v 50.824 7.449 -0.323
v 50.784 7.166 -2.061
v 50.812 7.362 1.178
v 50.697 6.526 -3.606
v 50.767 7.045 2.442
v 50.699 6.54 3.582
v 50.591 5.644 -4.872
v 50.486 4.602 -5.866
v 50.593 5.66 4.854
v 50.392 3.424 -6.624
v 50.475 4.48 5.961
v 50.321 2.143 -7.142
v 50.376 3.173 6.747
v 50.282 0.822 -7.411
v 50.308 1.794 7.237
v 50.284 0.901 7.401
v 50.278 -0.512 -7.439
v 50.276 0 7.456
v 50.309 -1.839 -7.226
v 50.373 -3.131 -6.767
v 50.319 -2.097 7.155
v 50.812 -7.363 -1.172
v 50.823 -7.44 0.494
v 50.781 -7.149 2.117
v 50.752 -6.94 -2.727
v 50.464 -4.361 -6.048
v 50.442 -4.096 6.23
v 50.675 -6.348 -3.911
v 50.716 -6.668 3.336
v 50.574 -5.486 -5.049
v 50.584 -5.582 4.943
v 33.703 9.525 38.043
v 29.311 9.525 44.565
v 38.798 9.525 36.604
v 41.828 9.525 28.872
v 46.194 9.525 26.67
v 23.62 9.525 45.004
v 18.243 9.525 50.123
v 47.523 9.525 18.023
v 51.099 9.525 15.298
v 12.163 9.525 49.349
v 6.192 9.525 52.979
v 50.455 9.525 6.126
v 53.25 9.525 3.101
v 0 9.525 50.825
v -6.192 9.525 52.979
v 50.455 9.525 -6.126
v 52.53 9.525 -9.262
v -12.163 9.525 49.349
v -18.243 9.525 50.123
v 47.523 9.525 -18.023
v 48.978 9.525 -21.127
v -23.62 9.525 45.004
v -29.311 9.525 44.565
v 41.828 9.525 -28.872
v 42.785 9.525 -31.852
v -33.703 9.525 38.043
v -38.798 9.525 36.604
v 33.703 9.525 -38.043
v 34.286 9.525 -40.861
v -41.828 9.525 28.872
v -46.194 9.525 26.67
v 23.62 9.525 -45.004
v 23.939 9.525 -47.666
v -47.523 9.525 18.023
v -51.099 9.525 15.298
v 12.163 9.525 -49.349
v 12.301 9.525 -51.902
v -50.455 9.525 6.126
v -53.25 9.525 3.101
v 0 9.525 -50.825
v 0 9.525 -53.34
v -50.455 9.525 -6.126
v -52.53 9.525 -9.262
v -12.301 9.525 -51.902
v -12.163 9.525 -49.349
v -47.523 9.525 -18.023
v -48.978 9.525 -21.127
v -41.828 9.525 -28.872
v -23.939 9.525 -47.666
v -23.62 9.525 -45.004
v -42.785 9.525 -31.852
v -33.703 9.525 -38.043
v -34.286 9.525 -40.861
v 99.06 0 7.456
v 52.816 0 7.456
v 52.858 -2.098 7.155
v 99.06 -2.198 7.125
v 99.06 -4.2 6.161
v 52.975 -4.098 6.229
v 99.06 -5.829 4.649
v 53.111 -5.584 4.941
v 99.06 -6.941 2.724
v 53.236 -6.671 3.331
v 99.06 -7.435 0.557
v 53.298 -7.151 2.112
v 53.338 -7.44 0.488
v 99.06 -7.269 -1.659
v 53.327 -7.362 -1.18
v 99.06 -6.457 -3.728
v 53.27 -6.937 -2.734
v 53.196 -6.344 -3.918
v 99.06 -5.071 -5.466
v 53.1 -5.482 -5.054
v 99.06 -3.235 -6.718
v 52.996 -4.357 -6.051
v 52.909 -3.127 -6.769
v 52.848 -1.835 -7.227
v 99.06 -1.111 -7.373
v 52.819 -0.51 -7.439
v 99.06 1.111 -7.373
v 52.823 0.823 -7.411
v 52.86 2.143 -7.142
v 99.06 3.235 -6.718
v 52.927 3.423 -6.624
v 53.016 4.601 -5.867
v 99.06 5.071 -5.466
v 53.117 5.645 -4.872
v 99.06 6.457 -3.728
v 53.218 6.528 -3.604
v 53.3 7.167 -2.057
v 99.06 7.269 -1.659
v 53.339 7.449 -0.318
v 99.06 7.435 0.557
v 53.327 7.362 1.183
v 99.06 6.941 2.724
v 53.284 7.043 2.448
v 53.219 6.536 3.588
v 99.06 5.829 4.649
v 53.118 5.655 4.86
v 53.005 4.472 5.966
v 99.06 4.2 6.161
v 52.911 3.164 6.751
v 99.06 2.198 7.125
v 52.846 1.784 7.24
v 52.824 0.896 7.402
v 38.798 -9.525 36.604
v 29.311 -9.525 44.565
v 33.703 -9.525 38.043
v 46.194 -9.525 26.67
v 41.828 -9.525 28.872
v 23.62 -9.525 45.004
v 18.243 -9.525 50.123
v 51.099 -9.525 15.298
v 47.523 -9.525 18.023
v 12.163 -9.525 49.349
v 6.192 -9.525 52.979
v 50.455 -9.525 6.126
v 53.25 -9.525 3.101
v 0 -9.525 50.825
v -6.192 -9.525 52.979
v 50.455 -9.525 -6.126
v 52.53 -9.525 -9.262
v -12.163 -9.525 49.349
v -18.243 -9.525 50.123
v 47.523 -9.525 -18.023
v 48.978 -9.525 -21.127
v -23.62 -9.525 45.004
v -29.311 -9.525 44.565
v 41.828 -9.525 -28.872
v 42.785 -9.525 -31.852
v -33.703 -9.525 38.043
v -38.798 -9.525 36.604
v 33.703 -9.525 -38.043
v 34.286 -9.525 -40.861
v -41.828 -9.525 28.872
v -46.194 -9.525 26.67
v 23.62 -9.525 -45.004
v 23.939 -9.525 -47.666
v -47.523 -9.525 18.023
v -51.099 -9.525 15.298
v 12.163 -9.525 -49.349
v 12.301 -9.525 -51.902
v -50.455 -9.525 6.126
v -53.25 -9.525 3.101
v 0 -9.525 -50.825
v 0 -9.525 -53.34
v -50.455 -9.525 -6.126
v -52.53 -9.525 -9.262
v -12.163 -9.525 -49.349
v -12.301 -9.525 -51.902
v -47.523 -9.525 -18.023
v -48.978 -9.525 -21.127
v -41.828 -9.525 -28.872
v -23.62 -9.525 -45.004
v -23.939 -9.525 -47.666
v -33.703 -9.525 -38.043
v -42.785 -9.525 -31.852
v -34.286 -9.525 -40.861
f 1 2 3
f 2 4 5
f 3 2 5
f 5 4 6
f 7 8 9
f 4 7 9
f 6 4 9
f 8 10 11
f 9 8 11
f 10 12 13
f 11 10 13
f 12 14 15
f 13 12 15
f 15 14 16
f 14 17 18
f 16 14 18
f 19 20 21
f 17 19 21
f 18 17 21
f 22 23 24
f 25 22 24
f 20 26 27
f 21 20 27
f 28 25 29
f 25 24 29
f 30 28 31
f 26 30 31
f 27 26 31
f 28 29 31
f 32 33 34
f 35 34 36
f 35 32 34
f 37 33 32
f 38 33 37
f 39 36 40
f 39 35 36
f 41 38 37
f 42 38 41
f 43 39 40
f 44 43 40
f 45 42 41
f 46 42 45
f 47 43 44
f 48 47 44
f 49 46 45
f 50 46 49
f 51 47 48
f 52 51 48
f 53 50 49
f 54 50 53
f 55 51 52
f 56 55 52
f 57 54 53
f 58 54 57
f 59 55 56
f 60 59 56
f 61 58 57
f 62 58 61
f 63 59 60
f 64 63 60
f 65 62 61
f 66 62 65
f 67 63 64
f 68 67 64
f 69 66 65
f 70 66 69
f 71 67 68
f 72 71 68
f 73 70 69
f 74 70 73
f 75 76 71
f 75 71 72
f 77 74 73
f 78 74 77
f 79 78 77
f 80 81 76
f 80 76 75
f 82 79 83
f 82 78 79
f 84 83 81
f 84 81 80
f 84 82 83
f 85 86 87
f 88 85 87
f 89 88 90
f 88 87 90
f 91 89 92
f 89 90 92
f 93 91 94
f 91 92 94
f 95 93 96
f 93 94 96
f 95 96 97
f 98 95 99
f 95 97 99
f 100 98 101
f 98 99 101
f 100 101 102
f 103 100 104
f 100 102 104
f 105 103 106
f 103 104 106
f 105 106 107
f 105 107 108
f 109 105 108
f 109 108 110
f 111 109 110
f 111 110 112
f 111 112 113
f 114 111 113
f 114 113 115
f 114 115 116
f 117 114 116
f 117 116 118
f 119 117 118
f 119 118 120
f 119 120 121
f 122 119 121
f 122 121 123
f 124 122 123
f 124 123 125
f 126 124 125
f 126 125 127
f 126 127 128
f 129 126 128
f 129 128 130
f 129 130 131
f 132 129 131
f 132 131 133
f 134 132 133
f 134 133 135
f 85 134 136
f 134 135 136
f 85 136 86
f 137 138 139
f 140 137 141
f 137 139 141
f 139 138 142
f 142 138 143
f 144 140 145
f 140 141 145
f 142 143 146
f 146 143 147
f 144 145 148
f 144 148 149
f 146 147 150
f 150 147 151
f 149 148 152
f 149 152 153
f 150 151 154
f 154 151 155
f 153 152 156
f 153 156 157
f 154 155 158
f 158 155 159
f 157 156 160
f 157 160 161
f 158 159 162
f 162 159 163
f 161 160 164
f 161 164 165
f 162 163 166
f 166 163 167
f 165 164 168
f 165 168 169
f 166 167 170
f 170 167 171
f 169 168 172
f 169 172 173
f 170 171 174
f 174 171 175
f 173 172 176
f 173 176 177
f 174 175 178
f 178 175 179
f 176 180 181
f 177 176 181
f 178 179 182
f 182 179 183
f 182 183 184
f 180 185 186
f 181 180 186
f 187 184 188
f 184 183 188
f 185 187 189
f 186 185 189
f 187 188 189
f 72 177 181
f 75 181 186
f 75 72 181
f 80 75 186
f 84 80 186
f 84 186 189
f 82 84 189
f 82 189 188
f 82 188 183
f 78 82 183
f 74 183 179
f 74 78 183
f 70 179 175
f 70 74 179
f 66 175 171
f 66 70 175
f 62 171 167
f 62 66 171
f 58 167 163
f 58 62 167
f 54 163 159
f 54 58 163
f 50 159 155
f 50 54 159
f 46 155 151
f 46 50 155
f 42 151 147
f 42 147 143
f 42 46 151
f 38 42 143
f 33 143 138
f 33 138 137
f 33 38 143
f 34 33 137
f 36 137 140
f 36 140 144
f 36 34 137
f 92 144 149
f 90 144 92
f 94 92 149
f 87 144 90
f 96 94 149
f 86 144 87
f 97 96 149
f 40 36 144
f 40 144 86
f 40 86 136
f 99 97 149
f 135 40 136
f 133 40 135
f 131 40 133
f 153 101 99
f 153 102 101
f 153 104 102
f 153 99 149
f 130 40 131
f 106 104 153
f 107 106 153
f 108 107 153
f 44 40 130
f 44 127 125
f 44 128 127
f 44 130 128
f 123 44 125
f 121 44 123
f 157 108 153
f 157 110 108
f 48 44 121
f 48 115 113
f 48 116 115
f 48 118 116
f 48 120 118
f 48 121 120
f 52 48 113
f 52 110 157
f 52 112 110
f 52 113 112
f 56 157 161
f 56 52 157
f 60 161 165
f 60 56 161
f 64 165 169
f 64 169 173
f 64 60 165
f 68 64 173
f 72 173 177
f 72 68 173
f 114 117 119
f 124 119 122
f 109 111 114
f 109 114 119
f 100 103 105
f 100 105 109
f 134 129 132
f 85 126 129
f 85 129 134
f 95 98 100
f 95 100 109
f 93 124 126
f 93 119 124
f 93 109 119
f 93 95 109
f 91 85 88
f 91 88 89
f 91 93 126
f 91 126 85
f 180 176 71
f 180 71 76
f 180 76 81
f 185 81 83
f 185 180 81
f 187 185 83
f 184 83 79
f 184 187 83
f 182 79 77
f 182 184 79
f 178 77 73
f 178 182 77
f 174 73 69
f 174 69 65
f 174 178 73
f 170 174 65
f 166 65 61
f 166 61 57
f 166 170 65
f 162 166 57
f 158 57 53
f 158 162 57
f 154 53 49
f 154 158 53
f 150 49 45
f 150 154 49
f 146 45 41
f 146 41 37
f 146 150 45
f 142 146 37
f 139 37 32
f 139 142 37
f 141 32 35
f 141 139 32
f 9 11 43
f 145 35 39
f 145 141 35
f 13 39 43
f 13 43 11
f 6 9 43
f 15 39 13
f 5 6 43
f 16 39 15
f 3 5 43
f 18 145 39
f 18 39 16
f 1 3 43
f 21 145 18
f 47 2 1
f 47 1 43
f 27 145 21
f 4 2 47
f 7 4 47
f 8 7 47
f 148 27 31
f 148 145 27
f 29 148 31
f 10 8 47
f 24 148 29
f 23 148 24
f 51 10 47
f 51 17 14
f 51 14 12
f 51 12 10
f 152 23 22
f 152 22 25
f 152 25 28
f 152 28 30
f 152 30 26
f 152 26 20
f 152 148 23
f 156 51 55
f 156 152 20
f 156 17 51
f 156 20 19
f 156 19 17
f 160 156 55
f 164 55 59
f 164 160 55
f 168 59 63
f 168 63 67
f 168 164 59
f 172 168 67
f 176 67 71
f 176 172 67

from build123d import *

# Parameters (mm, degrees)
CROQUIS1_R              = 53.34
CROQUIS1_R_2            = 50.8254
SALIENTE_EXTRUIR1_DEPTH = 9.525
CROQUIS2_R              = 7.45617
SALIENTE_EXTRUIR2_DEPTH = 99.06
CROQUIS3_R              = 50.8254
CORTAR_EXTRUIR1_DEPTH   = 49.53


with BuildPart() as part:
    # Croquis1 → Saliente-Extruir1 (new, symmetric)
    with BuildSketch(Plane(origin=(0, 0, 0), x_dir=(1, 0, 0), z_dir=(0, 1, 0))):
        with Locations(Location((0, 0, 0), (0, 0, 90))):
            Circle(CROQUIS1_R)
        with Locations(Location((0, 0, 0), (0, 0, 90))):
            Circle(CROQUIS1_R_2, mode=Mode.SUBTRACT)
    extrude(amount=SALIENTE_EXTRUIR1_DEPTH, both=True)

    # Croquis2 → Saliente-Extruir2 (add)
    with BuildSketch(Plane(origin=(0, 0, 0), x_dir=(0, 0, -1), z_dir=(1, 0, 0))):
        with Locations(Location((0, 0, 0), (0, 0, 180))):
            Circle(CROQUIS2_R)
    extrude(amount=SALIENTE_EXTRUIR2_DEPTH)

    # Croquis3 → Cortar-Extruir1 (cut, symmetric)
    with BuildSketch(Plane.XZ.offset(9.525)):
        with Locations(Location((0, 0, 0), (0, 0, 270))):
            Circle(CROQUIS3_R)
    extrude(amount=CORTAR_EXTRUIR1_DEPTH, both=True, mode=Mode.SUBTRACT)


solid = part.part
